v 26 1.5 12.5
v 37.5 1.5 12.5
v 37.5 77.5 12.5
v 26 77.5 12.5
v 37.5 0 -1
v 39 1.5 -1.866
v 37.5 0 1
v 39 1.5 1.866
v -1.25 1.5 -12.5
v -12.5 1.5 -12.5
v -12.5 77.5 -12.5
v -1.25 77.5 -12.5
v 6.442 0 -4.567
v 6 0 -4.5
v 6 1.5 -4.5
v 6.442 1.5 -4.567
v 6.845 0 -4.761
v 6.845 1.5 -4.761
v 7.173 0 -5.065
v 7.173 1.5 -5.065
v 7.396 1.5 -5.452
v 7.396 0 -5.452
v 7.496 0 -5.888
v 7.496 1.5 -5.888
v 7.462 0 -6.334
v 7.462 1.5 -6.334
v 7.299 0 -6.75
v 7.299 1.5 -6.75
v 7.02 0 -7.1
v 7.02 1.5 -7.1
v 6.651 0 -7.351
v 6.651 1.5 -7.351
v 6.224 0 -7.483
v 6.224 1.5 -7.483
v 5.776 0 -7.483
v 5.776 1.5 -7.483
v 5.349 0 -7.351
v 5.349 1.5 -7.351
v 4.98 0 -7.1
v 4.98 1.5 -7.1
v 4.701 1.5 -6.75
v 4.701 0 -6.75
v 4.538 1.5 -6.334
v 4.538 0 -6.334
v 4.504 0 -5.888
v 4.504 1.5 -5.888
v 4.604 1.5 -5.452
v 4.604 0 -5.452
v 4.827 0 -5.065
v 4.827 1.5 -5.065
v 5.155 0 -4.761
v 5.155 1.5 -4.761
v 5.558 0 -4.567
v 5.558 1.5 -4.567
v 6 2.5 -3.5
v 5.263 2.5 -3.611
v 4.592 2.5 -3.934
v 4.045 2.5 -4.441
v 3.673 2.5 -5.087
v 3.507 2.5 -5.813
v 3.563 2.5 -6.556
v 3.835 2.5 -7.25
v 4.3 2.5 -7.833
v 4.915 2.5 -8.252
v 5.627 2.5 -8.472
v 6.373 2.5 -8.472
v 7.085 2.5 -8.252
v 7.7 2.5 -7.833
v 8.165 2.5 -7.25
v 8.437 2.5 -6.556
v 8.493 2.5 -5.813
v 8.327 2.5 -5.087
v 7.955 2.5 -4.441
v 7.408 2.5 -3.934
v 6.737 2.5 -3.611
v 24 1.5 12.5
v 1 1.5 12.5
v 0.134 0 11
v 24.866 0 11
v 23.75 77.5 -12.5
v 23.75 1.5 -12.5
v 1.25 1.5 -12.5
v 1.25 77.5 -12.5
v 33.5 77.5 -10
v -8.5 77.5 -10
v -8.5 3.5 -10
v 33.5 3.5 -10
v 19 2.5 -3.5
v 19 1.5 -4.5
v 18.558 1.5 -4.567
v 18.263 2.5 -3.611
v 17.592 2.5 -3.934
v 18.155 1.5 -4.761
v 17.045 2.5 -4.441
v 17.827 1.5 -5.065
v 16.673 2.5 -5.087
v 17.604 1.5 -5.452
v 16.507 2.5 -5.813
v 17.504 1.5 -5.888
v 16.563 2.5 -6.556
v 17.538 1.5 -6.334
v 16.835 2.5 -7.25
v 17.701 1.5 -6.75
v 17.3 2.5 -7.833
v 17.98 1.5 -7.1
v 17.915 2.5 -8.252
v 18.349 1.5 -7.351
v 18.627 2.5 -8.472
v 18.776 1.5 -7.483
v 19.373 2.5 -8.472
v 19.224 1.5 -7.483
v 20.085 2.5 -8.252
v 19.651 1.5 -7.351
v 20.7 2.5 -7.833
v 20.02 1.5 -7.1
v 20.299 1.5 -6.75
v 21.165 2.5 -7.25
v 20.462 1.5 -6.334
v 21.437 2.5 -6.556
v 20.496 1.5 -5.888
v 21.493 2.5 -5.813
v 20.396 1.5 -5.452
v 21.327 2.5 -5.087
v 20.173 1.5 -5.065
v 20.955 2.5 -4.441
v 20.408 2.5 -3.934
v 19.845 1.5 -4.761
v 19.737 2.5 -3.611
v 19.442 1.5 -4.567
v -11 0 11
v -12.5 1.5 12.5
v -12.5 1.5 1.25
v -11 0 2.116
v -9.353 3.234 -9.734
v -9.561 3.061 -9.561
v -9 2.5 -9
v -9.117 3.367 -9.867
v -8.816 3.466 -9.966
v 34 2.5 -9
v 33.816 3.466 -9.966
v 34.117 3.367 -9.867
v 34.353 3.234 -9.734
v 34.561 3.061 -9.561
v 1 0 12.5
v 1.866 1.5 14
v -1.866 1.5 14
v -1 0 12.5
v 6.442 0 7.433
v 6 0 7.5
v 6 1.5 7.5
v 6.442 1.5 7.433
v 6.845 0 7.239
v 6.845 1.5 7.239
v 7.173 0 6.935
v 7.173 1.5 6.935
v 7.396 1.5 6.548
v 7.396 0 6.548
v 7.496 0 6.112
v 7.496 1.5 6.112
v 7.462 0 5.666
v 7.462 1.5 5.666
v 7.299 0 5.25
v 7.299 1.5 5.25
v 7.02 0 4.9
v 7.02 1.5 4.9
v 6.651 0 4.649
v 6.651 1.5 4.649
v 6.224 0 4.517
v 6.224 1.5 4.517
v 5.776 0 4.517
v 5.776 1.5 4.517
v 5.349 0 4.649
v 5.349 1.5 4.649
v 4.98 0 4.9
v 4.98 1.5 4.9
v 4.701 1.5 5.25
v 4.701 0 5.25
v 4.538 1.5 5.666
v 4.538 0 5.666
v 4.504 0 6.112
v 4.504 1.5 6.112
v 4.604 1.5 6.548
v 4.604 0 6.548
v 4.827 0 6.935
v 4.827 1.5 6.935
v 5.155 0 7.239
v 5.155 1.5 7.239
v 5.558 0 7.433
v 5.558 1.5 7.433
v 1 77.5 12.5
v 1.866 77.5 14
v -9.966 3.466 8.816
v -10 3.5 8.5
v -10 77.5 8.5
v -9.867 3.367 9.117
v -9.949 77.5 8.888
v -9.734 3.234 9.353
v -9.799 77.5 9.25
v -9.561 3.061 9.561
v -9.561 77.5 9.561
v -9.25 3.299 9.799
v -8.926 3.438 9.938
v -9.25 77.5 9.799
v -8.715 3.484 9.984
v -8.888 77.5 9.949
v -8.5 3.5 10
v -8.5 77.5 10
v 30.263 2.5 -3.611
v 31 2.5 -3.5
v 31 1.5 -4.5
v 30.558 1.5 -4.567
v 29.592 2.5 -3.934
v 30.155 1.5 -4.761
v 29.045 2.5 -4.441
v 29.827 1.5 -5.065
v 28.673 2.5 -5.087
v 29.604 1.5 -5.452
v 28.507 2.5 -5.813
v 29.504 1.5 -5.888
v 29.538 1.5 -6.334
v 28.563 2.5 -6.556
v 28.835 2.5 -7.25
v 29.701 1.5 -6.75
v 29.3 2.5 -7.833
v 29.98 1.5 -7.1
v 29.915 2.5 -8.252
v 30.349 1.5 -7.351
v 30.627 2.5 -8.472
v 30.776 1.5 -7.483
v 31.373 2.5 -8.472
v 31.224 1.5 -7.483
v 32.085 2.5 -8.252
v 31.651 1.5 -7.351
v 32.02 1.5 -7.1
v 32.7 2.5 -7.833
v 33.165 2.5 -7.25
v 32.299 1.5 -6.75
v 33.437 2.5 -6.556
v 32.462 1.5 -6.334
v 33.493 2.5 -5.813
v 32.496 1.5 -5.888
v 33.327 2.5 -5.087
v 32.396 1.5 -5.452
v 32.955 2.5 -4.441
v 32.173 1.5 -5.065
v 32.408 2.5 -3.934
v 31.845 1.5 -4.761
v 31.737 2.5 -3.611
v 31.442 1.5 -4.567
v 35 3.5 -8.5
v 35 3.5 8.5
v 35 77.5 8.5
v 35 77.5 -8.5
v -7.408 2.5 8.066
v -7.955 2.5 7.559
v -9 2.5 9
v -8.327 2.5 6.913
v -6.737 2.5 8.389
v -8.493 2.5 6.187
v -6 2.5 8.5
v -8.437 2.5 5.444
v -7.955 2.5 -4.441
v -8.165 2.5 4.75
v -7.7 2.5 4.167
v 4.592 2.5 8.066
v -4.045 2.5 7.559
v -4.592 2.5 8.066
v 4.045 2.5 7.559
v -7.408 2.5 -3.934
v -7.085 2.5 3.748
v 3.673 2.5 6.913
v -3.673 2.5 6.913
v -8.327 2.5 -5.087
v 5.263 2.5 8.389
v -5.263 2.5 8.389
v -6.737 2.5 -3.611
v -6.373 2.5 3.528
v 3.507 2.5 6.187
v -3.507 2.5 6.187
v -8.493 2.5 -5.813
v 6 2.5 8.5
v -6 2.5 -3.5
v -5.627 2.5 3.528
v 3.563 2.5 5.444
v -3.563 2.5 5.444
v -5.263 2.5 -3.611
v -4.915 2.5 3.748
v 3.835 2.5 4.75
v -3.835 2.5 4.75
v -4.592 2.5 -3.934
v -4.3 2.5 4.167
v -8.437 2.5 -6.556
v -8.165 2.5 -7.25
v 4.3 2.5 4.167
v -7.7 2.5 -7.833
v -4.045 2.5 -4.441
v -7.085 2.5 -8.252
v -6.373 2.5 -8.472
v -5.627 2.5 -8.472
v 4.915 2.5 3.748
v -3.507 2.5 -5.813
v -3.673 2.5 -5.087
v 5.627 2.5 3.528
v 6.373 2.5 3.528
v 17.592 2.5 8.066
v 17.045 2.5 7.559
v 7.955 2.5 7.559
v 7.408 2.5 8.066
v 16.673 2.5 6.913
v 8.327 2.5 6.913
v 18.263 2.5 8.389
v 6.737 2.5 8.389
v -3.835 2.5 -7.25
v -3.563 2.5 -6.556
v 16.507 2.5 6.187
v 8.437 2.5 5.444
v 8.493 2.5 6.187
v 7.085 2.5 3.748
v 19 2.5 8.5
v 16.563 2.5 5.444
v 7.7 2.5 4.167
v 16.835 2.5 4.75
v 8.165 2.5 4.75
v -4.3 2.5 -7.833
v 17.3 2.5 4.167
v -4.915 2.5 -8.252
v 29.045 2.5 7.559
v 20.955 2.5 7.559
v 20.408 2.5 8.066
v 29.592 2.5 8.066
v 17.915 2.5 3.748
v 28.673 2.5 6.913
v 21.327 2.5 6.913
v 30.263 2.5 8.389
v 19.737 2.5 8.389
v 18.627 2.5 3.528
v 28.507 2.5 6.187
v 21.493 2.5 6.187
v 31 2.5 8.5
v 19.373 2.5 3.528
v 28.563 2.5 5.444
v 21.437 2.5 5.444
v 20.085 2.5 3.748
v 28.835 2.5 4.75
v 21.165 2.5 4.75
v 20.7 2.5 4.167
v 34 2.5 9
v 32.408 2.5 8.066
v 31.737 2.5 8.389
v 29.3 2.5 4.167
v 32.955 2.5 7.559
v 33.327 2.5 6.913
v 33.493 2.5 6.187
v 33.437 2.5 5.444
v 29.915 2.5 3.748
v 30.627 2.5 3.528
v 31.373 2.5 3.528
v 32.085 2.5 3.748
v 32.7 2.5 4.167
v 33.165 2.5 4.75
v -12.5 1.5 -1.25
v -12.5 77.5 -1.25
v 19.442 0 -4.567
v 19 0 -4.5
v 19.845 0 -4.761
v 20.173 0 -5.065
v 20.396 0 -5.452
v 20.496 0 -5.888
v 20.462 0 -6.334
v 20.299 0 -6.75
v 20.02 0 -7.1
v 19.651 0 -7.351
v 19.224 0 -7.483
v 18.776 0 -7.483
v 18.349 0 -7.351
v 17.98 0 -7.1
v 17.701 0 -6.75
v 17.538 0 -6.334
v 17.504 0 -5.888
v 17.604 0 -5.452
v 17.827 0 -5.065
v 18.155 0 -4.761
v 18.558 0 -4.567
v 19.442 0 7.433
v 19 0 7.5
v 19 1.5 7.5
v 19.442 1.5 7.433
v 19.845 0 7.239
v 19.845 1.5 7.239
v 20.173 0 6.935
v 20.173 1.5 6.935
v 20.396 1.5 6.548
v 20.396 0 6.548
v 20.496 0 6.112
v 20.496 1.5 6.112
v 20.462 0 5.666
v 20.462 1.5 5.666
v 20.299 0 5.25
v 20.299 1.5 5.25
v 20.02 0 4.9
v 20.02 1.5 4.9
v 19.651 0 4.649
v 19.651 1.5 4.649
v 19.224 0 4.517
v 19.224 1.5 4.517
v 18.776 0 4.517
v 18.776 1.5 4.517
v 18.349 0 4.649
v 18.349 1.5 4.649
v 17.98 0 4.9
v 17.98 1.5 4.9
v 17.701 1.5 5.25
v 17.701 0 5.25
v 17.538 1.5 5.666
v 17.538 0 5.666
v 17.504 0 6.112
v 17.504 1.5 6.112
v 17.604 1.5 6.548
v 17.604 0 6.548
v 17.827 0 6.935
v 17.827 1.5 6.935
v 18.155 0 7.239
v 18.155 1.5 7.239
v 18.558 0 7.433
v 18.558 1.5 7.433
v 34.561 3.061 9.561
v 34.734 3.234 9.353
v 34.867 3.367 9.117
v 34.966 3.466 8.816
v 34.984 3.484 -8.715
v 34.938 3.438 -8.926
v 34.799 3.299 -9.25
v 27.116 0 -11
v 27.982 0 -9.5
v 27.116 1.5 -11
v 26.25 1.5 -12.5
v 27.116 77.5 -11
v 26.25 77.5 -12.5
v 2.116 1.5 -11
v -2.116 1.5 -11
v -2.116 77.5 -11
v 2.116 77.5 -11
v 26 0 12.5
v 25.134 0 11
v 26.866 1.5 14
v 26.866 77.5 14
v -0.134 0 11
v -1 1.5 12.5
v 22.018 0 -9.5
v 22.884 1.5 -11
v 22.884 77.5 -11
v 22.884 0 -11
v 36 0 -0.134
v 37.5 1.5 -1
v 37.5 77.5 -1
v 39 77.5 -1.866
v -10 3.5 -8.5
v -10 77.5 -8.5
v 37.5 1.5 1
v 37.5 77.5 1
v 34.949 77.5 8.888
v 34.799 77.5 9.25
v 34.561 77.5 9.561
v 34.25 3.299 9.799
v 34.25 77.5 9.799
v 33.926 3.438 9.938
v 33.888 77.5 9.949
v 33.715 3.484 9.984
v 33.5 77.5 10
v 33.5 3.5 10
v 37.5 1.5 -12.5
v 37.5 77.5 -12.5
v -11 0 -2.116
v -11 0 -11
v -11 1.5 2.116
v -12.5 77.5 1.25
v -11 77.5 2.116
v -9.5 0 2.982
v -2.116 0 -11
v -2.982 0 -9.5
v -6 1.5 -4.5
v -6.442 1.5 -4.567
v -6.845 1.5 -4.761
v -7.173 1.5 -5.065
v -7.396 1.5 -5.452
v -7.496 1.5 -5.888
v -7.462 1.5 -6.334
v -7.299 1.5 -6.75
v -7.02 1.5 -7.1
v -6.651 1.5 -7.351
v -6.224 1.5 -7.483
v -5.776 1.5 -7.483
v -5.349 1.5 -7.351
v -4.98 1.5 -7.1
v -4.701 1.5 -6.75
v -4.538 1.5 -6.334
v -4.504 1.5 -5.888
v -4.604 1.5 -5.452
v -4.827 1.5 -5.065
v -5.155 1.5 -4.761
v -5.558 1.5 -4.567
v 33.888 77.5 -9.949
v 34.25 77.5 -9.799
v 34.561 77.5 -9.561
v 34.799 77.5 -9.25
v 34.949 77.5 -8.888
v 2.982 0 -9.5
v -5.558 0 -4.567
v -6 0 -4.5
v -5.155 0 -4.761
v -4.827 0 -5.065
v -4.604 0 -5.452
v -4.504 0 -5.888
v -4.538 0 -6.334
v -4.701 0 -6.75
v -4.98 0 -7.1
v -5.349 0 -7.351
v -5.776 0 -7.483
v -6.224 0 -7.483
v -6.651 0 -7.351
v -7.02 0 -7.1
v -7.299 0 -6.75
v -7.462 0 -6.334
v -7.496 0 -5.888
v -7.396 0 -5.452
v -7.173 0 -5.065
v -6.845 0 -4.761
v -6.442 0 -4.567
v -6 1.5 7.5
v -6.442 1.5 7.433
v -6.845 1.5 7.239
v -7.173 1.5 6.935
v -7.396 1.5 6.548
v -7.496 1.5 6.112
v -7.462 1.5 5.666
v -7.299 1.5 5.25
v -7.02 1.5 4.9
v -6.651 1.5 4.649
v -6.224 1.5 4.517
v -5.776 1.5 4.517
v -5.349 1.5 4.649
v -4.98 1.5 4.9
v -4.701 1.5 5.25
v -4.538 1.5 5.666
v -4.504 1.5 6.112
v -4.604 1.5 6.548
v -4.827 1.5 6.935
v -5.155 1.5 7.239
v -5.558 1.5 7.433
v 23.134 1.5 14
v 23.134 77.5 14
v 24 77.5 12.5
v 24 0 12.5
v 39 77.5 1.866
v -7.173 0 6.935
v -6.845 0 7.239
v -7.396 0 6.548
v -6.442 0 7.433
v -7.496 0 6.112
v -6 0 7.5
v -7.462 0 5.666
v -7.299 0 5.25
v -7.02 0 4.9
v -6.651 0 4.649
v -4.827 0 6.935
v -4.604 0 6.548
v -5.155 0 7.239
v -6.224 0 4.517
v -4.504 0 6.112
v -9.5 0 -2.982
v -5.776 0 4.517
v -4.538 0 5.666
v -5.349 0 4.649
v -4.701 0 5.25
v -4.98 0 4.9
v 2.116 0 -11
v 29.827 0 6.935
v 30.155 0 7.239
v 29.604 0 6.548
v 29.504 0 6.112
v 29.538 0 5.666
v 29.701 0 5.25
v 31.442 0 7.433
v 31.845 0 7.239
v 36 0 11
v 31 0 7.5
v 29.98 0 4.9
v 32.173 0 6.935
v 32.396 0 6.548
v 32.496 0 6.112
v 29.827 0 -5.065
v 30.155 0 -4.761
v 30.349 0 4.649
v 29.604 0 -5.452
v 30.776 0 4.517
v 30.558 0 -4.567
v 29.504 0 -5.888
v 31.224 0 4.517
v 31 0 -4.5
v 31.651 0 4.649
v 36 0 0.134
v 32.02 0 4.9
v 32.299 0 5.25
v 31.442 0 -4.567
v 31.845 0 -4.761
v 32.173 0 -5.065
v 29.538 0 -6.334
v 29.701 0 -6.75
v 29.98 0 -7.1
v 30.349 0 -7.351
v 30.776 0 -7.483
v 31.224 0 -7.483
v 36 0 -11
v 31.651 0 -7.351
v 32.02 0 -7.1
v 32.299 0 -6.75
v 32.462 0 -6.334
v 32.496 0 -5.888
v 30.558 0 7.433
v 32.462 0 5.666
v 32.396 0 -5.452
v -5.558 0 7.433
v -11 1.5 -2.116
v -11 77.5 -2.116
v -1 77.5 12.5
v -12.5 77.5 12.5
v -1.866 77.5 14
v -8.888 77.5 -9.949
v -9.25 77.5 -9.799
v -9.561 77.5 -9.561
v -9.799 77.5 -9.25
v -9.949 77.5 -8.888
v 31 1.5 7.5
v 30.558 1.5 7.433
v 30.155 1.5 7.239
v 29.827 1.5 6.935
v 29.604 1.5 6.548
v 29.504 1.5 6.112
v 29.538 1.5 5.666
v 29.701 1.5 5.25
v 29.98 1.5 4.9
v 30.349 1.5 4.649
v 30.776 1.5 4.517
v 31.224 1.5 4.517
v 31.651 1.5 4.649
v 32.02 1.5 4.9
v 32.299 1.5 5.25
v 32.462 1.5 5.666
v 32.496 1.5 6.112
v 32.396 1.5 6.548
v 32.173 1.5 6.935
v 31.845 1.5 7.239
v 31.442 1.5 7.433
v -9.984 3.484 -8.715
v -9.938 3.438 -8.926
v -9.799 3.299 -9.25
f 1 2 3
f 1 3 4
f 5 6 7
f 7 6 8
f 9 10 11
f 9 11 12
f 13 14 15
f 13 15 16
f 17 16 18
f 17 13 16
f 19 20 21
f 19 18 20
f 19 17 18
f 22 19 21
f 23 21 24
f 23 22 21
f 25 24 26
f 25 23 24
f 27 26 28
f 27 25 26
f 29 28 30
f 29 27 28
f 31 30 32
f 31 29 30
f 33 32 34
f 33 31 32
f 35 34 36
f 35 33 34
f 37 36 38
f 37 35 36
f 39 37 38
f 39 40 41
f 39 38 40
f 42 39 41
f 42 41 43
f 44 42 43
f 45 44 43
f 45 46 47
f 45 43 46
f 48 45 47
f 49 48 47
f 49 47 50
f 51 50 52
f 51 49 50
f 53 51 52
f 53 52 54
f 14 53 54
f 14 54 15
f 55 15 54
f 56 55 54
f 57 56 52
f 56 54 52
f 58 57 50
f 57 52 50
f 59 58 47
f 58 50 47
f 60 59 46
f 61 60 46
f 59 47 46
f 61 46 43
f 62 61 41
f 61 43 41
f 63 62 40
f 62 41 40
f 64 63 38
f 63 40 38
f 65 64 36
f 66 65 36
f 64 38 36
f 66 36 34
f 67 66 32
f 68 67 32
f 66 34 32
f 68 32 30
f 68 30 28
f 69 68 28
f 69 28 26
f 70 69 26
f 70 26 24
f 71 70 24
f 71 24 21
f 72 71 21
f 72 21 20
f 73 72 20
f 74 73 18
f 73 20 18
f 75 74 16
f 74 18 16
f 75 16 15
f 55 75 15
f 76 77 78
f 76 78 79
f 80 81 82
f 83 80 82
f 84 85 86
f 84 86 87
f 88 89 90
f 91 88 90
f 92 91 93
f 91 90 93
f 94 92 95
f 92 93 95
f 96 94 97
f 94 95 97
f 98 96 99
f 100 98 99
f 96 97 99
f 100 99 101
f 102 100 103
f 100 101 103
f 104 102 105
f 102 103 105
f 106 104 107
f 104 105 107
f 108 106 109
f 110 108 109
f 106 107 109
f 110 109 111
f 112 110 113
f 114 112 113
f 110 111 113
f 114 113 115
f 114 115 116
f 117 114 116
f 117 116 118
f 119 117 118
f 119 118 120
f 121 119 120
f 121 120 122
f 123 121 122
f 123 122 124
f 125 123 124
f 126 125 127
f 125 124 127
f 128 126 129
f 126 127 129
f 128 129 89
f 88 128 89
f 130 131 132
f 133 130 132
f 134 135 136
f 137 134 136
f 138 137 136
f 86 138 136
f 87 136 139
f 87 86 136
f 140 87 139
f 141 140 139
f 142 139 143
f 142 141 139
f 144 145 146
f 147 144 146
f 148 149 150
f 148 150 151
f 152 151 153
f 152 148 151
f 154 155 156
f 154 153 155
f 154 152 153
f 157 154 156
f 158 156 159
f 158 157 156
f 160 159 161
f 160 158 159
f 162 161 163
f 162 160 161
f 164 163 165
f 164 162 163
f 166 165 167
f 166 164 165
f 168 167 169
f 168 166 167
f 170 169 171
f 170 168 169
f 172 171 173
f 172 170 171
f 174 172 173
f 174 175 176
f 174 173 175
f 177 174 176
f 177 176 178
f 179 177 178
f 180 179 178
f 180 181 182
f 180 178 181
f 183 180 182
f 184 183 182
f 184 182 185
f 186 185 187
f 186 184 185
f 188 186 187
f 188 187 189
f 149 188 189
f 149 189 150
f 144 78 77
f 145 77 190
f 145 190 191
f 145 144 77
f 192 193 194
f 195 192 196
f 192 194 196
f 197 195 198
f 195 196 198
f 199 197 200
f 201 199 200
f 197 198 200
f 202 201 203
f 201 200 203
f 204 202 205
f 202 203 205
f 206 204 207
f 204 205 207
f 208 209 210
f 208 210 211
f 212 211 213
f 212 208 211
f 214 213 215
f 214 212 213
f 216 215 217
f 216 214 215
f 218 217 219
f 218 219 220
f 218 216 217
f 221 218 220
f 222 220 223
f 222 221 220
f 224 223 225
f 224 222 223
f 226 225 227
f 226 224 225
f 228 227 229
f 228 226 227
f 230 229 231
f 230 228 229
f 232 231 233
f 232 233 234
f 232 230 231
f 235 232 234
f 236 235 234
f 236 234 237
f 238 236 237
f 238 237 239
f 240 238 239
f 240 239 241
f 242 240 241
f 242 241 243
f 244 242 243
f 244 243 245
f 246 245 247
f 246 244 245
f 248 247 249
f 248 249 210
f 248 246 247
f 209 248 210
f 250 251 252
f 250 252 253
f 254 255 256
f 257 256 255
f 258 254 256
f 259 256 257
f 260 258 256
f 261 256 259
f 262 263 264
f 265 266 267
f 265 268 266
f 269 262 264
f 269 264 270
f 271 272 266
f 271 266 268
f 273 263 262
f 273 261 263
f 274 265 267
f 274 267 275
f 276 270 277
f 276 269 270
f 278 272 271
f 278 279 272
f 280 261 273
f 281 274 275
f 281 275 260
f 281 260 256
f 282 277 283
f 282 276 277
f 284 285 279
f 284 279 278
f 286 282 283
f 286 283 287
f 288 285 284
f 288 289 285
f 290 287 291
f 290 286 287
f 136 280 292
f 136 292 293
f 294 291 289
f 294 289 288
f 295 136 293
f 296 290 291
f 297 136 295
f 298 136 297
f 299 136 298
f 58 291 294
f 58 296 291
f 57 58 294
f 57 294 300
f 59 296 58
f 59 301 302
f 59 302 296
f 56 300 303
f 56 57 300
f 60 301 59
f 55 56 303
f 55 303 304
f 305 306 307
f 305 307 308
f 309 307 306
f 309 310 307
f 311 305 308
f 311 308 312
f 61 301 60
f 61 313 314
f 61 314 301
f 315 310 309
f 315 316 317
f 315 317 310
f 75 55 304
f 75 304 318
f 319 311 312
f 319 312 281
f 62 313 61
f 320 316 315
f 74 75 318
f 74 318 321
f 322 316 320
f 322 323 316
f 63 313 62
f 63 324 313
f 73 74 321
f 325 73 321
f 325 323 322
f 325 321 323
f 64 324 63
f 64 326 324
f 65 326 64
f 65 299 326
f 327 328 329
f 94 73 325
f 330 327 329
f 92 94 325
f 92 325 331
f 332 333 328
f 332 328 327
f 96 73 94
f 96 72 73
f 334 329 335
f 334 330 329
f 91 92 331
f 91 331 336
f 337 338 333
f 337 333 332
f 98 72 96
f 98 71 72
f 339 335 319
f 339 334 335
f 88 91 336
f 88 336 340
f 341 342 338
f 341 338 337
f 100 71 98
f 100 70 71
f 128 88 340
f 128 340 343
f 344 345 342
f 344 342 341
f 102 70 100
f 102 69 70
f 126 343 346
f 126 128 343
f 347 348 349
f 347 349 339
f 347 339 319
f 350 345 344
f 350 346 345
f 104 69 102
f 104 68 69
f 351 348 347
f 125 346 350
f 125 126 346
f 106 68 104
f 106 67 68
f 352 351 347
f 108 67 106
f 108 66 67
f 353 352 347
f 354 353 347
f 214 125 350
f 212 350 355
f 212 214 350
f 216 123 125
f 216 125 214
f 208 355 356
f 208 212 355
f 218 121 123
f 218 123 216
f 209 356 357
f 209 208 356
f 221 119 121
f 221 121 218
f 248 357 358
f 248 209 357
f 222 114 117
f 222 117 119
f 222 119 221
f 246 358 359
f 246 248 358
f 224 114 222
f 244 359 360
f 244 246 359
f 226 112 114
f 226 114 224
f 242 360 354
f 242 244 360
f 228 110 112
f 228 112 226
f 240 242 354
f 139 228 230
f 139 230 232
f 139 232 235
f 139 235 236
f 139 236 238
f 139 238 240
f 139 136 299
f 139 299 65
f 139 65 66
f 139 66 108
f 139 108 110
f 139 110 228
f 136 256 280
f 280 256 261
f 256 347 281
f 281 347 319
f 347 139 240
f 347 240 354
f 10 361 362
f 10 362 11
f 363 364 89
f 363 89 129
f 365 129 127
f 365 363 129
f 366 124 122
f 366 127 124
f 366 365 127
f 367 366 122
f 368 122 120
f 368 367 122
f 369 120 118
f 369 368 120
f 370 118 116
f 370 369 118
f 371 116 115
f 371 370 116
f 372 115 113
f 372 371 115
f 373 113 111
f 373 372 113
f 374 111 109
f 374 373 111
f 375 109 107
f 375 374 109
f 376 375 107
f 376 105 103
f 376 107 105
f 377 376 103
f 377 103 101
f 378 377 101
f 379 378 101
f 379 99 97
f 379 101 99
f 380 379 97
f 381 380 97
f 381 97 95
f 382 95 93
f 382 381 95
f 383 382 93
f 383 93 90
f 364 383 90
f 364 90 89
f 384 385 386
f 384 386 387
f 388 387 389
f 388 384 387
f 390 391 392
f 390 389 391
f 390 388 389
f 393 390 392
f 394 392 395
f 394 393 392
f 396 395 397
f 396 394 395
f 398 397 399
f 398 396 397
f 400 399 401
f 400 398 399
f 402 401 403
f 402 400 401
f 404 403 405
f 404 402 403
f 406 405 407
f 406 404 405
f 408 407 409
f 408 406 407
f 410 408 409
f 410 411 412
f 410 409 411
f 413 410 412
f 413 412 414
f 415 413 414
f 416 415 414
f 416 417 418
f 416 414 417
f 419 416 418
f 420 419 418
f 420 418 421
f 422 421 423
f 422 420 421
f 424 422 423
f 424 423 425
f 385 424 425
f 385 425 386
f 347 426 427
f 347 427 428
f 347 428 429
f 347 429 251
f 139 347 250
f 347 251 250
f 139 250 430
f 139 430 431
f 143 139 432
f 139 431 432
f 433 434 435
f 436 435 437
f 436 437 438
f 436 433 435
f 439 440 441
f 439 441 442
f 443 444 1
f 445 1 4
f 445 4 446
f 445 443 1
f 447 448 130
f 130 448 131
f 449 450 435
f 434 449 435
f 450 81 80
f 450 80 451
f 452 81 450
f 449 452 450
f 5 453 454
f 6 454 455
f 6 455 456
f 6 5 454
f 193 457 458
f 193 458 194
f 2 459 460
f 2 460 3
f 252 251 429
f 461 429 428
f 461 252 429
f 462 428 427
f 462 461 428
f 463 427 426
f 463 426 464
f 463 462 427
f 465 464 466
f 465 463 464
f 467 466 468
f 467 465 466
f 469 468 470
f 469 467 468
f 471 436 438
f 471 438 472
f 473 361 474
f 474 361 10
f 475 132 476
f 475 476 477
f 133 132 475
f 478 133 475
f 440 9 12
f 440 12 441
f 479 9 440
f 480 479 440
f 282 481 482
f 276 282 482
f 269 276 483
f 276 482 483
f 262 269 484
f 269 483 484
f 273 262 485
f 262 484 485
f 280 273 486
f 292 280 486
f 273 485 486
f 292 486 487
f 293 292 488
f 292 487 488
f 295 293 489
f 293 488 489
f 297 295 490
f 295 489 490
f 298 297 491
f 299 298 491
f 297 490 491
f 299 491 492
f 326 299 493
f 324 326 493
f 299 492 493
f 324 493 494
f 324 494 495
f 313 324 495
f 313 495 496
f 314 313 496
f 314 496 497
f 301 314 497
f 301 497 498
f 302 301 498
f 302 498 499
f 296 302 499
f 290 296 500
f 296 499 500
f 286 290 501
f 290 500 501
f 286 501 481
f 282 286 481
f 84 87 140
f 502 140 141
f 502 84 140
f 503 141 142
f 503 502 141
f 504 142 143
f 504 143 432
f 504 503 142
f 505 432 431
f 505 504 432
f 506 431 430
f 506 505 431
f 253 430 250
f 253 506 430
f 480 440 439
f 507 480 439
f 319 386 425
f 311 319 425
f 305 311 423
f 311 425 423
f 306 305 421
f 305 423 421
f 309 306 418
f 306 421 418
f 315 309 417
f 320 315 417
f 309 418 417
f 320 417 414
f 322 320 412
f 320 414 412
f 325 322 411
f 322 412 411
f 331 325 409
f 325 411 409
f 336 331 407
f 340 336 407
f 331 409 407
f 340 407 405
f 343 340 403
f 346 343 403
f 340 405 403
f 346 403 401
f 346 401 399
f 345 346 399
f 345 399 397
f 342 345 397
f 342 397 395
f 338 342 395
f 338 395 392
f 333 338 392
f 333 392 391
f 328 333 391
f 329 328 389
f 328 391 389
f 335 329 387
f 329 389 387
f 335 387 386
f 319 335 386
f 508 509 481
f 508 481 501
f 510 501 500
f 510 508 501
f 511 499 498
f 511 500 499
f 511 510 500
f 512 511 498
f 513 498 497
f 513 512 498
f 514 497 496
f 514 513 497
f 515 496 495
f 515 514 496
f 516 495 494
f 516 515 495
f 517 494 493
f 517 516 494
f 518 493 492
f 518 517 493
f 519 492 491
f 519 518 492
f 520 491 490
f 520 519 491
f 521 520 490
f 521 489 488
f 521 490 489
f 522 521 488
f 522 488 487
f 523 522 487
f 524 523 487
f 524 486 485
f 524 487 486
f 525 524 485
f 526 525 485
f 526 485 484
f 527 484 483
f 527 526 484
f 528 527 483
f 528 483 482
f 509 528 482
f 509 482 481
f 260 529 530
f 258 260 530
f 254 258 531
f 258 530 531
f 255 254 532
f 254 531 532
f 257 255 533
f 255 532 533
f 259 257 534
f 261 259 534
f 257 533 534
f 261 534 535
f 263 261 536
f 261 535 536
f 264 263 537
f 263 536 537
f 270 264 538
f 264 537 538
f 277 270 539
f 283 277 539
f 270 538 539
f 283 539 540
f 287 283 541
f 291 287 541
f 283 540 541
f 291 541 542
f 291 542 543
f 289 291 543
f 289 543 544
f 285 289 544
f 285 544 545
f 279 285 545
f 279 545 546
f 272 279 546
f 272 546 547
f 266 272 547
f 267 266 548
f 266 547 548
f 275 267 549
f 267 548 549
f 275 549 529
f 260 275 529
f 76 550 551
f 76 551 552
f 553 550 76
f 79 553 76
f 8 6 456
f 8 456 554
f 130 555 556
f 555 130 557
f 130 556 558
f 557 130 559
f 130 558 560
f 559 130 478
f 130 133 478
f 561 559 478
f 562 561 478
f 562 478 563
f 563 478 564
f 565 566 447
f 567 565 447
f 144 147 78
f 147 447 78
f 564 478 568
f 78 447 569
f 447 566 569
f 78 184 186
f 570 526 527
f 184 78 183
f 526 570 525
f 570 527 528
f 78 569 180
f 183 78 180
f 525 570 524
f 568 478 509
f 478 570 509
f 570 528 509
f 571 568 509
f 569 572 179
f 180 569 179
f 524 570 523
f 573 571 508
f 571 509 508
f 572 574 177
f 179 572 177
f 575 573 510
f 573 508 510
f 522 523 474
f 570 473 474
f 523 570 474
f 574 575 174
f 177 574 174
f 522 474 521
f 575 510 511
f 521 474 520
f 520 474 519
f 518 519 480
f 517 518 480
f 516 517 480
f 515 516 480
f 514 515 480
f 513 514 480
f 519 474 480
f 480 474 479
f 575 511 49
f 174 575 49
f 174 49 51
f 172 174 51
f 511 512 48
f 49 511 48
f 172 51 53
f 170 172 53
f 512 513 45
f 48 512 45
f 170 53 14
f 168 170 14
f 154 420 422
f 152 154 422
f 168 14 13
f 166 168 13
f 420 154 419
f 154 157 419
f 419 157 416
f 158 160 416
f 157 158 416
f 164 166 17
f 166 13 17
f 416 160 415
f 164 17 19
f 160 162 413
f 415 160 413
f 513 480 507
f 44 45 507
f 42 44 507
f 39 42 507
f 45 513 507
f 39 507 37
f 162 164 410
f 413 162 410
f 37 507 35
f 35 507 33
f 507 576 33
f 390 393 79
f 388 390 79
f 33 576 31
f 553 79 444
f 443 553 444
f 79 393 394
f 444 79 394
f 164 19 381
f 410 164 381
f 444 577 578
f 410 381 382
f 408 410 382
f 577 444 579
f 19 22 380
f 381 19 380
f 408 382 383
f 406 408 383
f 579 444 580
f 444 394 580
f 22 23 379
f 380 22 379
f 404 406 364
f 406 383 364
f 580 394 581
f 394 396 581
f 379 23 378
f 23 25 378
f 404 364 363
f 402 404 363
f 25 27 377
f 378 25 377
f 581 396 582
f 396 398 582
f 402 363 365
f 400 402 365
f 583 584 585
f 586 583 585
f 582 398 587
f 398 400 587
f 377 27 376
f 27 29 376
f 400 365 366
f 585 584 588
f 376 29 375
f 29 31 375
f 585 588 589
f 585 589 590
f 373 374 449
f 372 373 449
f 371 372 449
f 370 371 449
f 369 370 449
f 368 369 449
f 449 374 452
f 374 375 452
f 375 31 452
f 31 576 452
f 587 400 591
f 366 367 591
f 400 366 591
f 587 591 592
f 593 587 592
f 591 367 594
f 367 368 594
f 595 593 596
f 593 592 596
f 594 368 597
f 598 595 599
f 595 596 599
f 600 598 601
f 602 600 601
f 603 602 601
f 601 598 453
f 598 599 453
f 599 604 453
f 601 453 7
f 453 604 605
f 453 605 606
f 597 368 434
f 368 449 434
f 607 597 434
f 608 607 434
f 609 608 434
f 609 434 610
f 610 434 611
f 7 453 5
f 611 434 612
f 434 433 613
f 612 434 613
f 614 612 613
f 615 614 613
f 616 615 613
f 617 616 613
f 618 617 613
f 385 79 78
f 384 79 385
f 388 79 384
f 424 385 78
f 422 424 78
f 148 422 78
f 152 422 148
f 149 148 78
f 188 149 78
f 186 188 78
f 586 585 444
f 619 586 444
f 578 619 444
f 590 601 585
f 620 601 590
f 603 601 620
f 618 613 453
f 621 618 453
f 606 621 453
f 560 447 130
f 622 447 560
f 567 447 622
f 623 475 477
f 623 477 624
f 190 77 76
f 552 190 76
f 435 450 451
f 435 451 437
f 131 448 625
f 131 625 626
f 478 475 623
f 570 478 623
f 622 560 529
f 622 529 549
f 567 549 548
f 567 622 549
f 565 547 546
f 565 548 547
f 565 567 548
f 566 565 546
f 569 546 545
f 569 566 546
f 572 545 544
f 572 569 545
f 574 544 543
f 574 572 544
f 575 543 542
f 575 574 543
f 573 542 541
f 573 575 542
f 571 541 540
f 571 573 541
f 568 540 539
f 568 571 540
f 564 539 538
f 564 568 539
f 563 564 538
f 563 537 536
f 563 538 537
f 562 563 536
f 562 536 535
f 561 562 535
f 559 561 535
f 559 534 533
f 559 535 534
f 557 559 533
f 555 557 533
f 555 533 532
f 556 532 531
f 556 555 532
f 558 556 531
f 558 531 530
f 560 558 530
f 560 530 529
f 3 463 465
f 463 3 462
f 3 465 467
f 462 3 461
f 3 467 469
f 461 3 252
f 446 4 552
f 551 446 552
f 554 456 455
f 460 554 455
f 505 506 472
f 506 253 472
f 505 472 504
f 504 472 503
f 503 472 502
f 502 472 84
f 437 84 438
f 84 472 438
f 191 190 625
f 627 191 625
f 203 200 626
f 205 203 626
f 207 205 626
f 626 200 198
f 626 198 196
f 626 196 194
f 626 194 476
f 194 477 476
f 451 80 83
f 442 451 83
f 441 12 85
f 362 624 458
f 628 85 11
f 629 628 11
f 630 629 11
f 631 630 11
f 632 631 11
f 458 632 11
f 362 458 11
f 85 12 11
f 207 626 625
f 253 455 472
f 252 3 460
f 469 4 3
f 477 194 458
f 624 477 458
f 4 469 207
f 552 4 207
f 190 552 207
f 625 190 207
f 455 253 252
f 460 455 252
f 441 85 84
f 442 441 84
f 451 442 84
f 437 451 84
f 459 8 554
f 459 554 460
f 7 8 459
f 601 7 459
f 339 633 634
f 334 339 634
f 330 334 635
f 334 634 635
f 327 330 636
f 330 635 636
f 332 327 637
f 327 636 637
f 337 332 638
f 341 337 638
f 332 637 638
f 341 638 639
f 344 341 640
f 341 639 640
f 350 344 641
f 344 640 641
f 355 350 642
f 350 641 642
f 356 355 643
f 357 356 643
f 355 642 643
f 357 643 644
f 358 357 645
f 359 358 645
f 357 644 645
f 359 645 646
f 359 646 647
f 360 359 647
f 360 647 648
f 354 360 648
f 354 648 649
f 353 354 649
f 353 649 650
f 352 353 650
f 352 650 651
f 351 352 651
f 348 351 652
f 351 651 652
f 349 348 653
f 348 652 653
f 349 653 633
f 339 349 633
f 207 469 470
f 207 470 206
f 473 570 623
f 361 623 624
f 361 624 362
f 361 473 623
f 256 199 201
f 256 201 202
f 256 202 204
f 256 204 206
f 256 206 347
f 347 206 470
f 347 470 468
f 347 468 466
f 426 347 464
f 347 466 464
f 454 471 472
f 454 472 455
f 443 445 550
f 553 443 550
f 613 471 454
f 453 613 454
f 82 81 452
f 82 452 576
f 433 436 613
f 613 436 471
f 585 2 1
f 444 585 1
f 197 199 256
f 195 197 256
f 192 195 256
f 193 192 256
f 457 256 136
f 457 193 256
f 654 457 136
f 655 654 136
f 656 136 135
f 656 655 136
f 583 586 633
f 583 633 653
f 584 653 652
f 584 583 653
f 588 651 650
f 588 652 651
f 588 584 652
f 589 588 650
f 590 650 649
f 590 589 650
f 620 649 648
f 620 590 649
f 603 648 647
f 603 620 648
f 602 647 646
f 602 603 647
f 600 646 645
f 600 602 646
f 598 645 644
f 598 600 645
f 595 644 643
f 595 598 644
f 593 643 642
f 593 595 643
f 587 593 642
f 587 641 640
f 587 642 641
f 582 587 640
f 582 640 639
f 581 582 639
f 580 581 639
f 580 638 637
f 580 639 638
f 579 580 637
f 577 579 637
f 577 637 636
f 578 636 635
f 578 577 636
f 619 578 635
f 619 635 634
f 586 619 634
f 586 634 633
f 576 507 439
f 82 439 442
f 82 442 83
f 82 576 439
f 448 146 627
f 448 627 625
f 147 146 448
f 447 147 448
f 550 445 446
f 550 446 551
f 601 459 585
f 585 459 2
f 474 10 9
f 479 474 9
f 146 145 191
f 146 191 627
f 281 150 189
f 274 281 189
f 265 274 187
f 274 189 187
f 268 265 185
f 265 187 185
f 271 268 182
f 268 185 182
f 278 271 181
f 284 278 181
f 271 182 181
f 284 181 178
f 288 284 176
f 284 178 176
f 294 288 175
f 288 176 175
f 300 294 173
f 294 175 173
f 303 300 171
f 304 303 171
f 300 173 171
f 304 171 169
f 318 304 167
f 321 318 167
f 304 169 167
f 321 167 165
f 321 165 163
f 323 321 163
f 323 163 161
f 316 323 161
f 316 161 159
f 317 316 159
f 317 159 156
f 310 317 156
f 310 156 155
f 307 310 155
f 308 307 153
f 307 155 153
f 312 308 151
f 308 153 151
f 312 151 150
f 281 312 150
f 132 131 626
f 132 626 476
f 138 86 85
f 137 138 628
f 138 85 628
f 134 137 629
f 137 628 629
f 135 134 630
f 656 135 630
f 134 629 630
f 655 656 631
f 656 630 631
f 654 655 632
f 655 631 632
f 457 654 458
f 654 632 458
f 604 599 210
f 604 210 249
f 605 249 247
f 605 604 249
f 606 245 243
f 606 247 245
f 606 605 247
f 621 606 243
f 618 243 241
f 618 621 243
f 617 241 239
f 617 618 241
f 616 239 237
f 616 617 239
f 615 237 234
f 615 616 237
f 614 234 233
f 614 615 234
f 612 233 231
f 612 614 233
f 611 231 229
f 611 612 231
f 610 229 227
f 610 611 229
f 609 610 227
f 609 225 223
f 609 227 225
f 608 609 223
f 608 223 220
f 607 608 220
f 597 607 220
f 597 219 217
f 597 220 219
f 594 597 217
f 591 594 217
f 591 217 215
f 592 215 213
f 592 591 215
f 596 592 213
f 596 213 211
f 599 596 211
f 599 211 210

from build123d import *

# Parameters (mm, degrees)
BOSS_EXTRUDE1_DEPTH     = 77.5
SKETCH2_W               = 45
SKETCH2_H               = 20
BOSS_EXTRUDE2_DEPTH     = 2.5
CUT_EXTRUDE1_DEPTH      = 86.685471347
CUT_EXTRUDE1_DEPTH_BACK = 86.685471347
SKETCH3_R               = 1.5
CHAMFER3_SIZE           = 1.5
CHAMFER2_SIZE           = 1
FILLET1_R               = 1.5


with BuildPart() as part:
    # Sketch1 → Boss-Extrude1 (new body)
    with BuildSketch(Plane(origin=(0, 0, 0), x_dir=(1, 0, 0), z_dir=(0, 1, 0))):
        Polygon((12.5, -12.5), (1, -12.5), (1.866025404, -14), (-1.866025404, -14), (-1, -12.5), (-12.5, -12.5), (-12.5, -1.25), (-11, -2.116025404), (-11, 2.116025404), (-12.5, 1.25), (-12.5, 12.5), (-1.25, 12.5), (-2.116025404, 11), (2.116025404, 11), (1.25, 12.5), (12.5, 12.5), (23.75, 12.5), (22.883974596, 11), (27.116025404, 11), (26.25, 12.5), (37.5, 12.5), (37.5, 1), (39, 1.866025404), (39, -1.866025404), (37.5, -1), (37.5, -12.5), (26, -12.5), (26.866025404, -14), (23.133974596, -14), (24, -12.5), align=None)
        Polygon((15, -10), (35, -10), (35, 10), (15, 10), (10, 10), (-10, 10), (-10, -10), (10, -10), align=None, mode=Mode.SUBTRACT)
    extrude(amount=BOSS_EXTRUDE1_DEPTH)

    # Sketch2 → Boss-Extrude2 (add)
    with BuildSketch(Plane(origin=(0, 0, 0), x_dir=(1, 0, 0), z_dir=(0, 1, 0))):
        with Locations((12.5, 0)):
            Rectangle(SKETCH2_W, SKETCH2_H)
    extrude(amount=BOSS_EXTRUDE2_DEPTH)

    # Sketch3 → Cut-Extrude1 (cut, two sides: drawn at the far end of the back side and taken through both)
    with BuildSketch(Plane(origin=(0, 2.5, 0), x_dir=(1, 0, 0), z_dir=(0, 1, 0)).offset(-CUT_EXTRUDE1_DEPTH_BACK)):
        with Locations(Location((-6, 6, 0), (0, 0, 270))):
            Circle(SKETCH3_R)
        with Locations(Location((6, 6, 0), (0, 0, 270))):
            Circle(SKETCH3_R)
        with Locations(Location((6, -6, 0), (0, 0, 270))):
            Circle(SKETCH3_R)
        with Locations(Location((-6, -6, 0), (0, 0, 270))):
            Circle(SKETCH3_R)
        with Locations(Location((31, -6, 0), (0, 0, 270))):
            Circle(SKETCH3_R)
        with Locations(Location((19, -6, 0), (0, 0, 270))):
            Circle(SKETCH3_R)
        with Locations(Location((19, 6, 0), (0, 0, 270))):
            Circle(SKETCH3_R)
        with Locations(Location((31, 6, 0), (0, 0, 270))):
            Circle(SKETCH3_R)
    extrude(amount=CUT_EXTRUDE1_DEPTH + CUT_EXTRUDE1_DEPTH_BACK, mode=Mode.SUBTRACT)

    # Chamfer3
    chamfer3_edges = [part.edges().sort_by_distance(p)[0] for p in [
        (-11, 0, 0),
        (0, 0, 14),
        (25, 0, 14),
        (39, 0, 0),
        (0, 0, -11),
        (25, 0, -11),
        (-6.875, 0, -12.5),
        (-12.5, 0, -6.875),
        (-12.5, 0, 6.875),
        (-6.75, 0, 12.5),
        (12.5, 0, 12.5),
        (37.5, 0, 6.75),
        (31.75, 0, 12.5),
        (37.5, 0, -6.75),
        (31.875, 0, -12.5),
        (12.5, 0, -12.5),
    ]]
    chamfer(chamfer3_edges, length=CHAMFER3_SIZE - 0.0001)  # a hair under: the kernel refuses the full size

    # Chamfer2
    chamfer2_edges = [part.edges().sort_by_distance(p)[0] for p in [
        (12.5, 2.5, -10),
        (-10, 2.5, 0),
        (12.5, 2.5, 10),
        (35, 2.5, 0),
        (31, 2.5, 4.5),
        (-6, 2.5, 4.5),
        (6, 2.5, 4.5),
        (6, 2.5, -7.5),
        (19, 2.5, 4.5),
        (19, 2.5, -7.5),
        (31, 2.5, -7.5),
        (-6, 2.5, -7.5),
    ]]
    chamfer(chamfer2_edges, length=CHAMFER2_SIZE)

    # Fillet1
    fillet1_edges = [part.edges().sort_by_distance(p)[0] for p in [
        (35, 40.5, 10),
        (35, 40.5, -10),
        (-10, 40.5, -10),
        (-10, 40.5, 10),
    ]]
    fillet(fillet1_edges, radius=FILLET1_R)


solid = part.part
